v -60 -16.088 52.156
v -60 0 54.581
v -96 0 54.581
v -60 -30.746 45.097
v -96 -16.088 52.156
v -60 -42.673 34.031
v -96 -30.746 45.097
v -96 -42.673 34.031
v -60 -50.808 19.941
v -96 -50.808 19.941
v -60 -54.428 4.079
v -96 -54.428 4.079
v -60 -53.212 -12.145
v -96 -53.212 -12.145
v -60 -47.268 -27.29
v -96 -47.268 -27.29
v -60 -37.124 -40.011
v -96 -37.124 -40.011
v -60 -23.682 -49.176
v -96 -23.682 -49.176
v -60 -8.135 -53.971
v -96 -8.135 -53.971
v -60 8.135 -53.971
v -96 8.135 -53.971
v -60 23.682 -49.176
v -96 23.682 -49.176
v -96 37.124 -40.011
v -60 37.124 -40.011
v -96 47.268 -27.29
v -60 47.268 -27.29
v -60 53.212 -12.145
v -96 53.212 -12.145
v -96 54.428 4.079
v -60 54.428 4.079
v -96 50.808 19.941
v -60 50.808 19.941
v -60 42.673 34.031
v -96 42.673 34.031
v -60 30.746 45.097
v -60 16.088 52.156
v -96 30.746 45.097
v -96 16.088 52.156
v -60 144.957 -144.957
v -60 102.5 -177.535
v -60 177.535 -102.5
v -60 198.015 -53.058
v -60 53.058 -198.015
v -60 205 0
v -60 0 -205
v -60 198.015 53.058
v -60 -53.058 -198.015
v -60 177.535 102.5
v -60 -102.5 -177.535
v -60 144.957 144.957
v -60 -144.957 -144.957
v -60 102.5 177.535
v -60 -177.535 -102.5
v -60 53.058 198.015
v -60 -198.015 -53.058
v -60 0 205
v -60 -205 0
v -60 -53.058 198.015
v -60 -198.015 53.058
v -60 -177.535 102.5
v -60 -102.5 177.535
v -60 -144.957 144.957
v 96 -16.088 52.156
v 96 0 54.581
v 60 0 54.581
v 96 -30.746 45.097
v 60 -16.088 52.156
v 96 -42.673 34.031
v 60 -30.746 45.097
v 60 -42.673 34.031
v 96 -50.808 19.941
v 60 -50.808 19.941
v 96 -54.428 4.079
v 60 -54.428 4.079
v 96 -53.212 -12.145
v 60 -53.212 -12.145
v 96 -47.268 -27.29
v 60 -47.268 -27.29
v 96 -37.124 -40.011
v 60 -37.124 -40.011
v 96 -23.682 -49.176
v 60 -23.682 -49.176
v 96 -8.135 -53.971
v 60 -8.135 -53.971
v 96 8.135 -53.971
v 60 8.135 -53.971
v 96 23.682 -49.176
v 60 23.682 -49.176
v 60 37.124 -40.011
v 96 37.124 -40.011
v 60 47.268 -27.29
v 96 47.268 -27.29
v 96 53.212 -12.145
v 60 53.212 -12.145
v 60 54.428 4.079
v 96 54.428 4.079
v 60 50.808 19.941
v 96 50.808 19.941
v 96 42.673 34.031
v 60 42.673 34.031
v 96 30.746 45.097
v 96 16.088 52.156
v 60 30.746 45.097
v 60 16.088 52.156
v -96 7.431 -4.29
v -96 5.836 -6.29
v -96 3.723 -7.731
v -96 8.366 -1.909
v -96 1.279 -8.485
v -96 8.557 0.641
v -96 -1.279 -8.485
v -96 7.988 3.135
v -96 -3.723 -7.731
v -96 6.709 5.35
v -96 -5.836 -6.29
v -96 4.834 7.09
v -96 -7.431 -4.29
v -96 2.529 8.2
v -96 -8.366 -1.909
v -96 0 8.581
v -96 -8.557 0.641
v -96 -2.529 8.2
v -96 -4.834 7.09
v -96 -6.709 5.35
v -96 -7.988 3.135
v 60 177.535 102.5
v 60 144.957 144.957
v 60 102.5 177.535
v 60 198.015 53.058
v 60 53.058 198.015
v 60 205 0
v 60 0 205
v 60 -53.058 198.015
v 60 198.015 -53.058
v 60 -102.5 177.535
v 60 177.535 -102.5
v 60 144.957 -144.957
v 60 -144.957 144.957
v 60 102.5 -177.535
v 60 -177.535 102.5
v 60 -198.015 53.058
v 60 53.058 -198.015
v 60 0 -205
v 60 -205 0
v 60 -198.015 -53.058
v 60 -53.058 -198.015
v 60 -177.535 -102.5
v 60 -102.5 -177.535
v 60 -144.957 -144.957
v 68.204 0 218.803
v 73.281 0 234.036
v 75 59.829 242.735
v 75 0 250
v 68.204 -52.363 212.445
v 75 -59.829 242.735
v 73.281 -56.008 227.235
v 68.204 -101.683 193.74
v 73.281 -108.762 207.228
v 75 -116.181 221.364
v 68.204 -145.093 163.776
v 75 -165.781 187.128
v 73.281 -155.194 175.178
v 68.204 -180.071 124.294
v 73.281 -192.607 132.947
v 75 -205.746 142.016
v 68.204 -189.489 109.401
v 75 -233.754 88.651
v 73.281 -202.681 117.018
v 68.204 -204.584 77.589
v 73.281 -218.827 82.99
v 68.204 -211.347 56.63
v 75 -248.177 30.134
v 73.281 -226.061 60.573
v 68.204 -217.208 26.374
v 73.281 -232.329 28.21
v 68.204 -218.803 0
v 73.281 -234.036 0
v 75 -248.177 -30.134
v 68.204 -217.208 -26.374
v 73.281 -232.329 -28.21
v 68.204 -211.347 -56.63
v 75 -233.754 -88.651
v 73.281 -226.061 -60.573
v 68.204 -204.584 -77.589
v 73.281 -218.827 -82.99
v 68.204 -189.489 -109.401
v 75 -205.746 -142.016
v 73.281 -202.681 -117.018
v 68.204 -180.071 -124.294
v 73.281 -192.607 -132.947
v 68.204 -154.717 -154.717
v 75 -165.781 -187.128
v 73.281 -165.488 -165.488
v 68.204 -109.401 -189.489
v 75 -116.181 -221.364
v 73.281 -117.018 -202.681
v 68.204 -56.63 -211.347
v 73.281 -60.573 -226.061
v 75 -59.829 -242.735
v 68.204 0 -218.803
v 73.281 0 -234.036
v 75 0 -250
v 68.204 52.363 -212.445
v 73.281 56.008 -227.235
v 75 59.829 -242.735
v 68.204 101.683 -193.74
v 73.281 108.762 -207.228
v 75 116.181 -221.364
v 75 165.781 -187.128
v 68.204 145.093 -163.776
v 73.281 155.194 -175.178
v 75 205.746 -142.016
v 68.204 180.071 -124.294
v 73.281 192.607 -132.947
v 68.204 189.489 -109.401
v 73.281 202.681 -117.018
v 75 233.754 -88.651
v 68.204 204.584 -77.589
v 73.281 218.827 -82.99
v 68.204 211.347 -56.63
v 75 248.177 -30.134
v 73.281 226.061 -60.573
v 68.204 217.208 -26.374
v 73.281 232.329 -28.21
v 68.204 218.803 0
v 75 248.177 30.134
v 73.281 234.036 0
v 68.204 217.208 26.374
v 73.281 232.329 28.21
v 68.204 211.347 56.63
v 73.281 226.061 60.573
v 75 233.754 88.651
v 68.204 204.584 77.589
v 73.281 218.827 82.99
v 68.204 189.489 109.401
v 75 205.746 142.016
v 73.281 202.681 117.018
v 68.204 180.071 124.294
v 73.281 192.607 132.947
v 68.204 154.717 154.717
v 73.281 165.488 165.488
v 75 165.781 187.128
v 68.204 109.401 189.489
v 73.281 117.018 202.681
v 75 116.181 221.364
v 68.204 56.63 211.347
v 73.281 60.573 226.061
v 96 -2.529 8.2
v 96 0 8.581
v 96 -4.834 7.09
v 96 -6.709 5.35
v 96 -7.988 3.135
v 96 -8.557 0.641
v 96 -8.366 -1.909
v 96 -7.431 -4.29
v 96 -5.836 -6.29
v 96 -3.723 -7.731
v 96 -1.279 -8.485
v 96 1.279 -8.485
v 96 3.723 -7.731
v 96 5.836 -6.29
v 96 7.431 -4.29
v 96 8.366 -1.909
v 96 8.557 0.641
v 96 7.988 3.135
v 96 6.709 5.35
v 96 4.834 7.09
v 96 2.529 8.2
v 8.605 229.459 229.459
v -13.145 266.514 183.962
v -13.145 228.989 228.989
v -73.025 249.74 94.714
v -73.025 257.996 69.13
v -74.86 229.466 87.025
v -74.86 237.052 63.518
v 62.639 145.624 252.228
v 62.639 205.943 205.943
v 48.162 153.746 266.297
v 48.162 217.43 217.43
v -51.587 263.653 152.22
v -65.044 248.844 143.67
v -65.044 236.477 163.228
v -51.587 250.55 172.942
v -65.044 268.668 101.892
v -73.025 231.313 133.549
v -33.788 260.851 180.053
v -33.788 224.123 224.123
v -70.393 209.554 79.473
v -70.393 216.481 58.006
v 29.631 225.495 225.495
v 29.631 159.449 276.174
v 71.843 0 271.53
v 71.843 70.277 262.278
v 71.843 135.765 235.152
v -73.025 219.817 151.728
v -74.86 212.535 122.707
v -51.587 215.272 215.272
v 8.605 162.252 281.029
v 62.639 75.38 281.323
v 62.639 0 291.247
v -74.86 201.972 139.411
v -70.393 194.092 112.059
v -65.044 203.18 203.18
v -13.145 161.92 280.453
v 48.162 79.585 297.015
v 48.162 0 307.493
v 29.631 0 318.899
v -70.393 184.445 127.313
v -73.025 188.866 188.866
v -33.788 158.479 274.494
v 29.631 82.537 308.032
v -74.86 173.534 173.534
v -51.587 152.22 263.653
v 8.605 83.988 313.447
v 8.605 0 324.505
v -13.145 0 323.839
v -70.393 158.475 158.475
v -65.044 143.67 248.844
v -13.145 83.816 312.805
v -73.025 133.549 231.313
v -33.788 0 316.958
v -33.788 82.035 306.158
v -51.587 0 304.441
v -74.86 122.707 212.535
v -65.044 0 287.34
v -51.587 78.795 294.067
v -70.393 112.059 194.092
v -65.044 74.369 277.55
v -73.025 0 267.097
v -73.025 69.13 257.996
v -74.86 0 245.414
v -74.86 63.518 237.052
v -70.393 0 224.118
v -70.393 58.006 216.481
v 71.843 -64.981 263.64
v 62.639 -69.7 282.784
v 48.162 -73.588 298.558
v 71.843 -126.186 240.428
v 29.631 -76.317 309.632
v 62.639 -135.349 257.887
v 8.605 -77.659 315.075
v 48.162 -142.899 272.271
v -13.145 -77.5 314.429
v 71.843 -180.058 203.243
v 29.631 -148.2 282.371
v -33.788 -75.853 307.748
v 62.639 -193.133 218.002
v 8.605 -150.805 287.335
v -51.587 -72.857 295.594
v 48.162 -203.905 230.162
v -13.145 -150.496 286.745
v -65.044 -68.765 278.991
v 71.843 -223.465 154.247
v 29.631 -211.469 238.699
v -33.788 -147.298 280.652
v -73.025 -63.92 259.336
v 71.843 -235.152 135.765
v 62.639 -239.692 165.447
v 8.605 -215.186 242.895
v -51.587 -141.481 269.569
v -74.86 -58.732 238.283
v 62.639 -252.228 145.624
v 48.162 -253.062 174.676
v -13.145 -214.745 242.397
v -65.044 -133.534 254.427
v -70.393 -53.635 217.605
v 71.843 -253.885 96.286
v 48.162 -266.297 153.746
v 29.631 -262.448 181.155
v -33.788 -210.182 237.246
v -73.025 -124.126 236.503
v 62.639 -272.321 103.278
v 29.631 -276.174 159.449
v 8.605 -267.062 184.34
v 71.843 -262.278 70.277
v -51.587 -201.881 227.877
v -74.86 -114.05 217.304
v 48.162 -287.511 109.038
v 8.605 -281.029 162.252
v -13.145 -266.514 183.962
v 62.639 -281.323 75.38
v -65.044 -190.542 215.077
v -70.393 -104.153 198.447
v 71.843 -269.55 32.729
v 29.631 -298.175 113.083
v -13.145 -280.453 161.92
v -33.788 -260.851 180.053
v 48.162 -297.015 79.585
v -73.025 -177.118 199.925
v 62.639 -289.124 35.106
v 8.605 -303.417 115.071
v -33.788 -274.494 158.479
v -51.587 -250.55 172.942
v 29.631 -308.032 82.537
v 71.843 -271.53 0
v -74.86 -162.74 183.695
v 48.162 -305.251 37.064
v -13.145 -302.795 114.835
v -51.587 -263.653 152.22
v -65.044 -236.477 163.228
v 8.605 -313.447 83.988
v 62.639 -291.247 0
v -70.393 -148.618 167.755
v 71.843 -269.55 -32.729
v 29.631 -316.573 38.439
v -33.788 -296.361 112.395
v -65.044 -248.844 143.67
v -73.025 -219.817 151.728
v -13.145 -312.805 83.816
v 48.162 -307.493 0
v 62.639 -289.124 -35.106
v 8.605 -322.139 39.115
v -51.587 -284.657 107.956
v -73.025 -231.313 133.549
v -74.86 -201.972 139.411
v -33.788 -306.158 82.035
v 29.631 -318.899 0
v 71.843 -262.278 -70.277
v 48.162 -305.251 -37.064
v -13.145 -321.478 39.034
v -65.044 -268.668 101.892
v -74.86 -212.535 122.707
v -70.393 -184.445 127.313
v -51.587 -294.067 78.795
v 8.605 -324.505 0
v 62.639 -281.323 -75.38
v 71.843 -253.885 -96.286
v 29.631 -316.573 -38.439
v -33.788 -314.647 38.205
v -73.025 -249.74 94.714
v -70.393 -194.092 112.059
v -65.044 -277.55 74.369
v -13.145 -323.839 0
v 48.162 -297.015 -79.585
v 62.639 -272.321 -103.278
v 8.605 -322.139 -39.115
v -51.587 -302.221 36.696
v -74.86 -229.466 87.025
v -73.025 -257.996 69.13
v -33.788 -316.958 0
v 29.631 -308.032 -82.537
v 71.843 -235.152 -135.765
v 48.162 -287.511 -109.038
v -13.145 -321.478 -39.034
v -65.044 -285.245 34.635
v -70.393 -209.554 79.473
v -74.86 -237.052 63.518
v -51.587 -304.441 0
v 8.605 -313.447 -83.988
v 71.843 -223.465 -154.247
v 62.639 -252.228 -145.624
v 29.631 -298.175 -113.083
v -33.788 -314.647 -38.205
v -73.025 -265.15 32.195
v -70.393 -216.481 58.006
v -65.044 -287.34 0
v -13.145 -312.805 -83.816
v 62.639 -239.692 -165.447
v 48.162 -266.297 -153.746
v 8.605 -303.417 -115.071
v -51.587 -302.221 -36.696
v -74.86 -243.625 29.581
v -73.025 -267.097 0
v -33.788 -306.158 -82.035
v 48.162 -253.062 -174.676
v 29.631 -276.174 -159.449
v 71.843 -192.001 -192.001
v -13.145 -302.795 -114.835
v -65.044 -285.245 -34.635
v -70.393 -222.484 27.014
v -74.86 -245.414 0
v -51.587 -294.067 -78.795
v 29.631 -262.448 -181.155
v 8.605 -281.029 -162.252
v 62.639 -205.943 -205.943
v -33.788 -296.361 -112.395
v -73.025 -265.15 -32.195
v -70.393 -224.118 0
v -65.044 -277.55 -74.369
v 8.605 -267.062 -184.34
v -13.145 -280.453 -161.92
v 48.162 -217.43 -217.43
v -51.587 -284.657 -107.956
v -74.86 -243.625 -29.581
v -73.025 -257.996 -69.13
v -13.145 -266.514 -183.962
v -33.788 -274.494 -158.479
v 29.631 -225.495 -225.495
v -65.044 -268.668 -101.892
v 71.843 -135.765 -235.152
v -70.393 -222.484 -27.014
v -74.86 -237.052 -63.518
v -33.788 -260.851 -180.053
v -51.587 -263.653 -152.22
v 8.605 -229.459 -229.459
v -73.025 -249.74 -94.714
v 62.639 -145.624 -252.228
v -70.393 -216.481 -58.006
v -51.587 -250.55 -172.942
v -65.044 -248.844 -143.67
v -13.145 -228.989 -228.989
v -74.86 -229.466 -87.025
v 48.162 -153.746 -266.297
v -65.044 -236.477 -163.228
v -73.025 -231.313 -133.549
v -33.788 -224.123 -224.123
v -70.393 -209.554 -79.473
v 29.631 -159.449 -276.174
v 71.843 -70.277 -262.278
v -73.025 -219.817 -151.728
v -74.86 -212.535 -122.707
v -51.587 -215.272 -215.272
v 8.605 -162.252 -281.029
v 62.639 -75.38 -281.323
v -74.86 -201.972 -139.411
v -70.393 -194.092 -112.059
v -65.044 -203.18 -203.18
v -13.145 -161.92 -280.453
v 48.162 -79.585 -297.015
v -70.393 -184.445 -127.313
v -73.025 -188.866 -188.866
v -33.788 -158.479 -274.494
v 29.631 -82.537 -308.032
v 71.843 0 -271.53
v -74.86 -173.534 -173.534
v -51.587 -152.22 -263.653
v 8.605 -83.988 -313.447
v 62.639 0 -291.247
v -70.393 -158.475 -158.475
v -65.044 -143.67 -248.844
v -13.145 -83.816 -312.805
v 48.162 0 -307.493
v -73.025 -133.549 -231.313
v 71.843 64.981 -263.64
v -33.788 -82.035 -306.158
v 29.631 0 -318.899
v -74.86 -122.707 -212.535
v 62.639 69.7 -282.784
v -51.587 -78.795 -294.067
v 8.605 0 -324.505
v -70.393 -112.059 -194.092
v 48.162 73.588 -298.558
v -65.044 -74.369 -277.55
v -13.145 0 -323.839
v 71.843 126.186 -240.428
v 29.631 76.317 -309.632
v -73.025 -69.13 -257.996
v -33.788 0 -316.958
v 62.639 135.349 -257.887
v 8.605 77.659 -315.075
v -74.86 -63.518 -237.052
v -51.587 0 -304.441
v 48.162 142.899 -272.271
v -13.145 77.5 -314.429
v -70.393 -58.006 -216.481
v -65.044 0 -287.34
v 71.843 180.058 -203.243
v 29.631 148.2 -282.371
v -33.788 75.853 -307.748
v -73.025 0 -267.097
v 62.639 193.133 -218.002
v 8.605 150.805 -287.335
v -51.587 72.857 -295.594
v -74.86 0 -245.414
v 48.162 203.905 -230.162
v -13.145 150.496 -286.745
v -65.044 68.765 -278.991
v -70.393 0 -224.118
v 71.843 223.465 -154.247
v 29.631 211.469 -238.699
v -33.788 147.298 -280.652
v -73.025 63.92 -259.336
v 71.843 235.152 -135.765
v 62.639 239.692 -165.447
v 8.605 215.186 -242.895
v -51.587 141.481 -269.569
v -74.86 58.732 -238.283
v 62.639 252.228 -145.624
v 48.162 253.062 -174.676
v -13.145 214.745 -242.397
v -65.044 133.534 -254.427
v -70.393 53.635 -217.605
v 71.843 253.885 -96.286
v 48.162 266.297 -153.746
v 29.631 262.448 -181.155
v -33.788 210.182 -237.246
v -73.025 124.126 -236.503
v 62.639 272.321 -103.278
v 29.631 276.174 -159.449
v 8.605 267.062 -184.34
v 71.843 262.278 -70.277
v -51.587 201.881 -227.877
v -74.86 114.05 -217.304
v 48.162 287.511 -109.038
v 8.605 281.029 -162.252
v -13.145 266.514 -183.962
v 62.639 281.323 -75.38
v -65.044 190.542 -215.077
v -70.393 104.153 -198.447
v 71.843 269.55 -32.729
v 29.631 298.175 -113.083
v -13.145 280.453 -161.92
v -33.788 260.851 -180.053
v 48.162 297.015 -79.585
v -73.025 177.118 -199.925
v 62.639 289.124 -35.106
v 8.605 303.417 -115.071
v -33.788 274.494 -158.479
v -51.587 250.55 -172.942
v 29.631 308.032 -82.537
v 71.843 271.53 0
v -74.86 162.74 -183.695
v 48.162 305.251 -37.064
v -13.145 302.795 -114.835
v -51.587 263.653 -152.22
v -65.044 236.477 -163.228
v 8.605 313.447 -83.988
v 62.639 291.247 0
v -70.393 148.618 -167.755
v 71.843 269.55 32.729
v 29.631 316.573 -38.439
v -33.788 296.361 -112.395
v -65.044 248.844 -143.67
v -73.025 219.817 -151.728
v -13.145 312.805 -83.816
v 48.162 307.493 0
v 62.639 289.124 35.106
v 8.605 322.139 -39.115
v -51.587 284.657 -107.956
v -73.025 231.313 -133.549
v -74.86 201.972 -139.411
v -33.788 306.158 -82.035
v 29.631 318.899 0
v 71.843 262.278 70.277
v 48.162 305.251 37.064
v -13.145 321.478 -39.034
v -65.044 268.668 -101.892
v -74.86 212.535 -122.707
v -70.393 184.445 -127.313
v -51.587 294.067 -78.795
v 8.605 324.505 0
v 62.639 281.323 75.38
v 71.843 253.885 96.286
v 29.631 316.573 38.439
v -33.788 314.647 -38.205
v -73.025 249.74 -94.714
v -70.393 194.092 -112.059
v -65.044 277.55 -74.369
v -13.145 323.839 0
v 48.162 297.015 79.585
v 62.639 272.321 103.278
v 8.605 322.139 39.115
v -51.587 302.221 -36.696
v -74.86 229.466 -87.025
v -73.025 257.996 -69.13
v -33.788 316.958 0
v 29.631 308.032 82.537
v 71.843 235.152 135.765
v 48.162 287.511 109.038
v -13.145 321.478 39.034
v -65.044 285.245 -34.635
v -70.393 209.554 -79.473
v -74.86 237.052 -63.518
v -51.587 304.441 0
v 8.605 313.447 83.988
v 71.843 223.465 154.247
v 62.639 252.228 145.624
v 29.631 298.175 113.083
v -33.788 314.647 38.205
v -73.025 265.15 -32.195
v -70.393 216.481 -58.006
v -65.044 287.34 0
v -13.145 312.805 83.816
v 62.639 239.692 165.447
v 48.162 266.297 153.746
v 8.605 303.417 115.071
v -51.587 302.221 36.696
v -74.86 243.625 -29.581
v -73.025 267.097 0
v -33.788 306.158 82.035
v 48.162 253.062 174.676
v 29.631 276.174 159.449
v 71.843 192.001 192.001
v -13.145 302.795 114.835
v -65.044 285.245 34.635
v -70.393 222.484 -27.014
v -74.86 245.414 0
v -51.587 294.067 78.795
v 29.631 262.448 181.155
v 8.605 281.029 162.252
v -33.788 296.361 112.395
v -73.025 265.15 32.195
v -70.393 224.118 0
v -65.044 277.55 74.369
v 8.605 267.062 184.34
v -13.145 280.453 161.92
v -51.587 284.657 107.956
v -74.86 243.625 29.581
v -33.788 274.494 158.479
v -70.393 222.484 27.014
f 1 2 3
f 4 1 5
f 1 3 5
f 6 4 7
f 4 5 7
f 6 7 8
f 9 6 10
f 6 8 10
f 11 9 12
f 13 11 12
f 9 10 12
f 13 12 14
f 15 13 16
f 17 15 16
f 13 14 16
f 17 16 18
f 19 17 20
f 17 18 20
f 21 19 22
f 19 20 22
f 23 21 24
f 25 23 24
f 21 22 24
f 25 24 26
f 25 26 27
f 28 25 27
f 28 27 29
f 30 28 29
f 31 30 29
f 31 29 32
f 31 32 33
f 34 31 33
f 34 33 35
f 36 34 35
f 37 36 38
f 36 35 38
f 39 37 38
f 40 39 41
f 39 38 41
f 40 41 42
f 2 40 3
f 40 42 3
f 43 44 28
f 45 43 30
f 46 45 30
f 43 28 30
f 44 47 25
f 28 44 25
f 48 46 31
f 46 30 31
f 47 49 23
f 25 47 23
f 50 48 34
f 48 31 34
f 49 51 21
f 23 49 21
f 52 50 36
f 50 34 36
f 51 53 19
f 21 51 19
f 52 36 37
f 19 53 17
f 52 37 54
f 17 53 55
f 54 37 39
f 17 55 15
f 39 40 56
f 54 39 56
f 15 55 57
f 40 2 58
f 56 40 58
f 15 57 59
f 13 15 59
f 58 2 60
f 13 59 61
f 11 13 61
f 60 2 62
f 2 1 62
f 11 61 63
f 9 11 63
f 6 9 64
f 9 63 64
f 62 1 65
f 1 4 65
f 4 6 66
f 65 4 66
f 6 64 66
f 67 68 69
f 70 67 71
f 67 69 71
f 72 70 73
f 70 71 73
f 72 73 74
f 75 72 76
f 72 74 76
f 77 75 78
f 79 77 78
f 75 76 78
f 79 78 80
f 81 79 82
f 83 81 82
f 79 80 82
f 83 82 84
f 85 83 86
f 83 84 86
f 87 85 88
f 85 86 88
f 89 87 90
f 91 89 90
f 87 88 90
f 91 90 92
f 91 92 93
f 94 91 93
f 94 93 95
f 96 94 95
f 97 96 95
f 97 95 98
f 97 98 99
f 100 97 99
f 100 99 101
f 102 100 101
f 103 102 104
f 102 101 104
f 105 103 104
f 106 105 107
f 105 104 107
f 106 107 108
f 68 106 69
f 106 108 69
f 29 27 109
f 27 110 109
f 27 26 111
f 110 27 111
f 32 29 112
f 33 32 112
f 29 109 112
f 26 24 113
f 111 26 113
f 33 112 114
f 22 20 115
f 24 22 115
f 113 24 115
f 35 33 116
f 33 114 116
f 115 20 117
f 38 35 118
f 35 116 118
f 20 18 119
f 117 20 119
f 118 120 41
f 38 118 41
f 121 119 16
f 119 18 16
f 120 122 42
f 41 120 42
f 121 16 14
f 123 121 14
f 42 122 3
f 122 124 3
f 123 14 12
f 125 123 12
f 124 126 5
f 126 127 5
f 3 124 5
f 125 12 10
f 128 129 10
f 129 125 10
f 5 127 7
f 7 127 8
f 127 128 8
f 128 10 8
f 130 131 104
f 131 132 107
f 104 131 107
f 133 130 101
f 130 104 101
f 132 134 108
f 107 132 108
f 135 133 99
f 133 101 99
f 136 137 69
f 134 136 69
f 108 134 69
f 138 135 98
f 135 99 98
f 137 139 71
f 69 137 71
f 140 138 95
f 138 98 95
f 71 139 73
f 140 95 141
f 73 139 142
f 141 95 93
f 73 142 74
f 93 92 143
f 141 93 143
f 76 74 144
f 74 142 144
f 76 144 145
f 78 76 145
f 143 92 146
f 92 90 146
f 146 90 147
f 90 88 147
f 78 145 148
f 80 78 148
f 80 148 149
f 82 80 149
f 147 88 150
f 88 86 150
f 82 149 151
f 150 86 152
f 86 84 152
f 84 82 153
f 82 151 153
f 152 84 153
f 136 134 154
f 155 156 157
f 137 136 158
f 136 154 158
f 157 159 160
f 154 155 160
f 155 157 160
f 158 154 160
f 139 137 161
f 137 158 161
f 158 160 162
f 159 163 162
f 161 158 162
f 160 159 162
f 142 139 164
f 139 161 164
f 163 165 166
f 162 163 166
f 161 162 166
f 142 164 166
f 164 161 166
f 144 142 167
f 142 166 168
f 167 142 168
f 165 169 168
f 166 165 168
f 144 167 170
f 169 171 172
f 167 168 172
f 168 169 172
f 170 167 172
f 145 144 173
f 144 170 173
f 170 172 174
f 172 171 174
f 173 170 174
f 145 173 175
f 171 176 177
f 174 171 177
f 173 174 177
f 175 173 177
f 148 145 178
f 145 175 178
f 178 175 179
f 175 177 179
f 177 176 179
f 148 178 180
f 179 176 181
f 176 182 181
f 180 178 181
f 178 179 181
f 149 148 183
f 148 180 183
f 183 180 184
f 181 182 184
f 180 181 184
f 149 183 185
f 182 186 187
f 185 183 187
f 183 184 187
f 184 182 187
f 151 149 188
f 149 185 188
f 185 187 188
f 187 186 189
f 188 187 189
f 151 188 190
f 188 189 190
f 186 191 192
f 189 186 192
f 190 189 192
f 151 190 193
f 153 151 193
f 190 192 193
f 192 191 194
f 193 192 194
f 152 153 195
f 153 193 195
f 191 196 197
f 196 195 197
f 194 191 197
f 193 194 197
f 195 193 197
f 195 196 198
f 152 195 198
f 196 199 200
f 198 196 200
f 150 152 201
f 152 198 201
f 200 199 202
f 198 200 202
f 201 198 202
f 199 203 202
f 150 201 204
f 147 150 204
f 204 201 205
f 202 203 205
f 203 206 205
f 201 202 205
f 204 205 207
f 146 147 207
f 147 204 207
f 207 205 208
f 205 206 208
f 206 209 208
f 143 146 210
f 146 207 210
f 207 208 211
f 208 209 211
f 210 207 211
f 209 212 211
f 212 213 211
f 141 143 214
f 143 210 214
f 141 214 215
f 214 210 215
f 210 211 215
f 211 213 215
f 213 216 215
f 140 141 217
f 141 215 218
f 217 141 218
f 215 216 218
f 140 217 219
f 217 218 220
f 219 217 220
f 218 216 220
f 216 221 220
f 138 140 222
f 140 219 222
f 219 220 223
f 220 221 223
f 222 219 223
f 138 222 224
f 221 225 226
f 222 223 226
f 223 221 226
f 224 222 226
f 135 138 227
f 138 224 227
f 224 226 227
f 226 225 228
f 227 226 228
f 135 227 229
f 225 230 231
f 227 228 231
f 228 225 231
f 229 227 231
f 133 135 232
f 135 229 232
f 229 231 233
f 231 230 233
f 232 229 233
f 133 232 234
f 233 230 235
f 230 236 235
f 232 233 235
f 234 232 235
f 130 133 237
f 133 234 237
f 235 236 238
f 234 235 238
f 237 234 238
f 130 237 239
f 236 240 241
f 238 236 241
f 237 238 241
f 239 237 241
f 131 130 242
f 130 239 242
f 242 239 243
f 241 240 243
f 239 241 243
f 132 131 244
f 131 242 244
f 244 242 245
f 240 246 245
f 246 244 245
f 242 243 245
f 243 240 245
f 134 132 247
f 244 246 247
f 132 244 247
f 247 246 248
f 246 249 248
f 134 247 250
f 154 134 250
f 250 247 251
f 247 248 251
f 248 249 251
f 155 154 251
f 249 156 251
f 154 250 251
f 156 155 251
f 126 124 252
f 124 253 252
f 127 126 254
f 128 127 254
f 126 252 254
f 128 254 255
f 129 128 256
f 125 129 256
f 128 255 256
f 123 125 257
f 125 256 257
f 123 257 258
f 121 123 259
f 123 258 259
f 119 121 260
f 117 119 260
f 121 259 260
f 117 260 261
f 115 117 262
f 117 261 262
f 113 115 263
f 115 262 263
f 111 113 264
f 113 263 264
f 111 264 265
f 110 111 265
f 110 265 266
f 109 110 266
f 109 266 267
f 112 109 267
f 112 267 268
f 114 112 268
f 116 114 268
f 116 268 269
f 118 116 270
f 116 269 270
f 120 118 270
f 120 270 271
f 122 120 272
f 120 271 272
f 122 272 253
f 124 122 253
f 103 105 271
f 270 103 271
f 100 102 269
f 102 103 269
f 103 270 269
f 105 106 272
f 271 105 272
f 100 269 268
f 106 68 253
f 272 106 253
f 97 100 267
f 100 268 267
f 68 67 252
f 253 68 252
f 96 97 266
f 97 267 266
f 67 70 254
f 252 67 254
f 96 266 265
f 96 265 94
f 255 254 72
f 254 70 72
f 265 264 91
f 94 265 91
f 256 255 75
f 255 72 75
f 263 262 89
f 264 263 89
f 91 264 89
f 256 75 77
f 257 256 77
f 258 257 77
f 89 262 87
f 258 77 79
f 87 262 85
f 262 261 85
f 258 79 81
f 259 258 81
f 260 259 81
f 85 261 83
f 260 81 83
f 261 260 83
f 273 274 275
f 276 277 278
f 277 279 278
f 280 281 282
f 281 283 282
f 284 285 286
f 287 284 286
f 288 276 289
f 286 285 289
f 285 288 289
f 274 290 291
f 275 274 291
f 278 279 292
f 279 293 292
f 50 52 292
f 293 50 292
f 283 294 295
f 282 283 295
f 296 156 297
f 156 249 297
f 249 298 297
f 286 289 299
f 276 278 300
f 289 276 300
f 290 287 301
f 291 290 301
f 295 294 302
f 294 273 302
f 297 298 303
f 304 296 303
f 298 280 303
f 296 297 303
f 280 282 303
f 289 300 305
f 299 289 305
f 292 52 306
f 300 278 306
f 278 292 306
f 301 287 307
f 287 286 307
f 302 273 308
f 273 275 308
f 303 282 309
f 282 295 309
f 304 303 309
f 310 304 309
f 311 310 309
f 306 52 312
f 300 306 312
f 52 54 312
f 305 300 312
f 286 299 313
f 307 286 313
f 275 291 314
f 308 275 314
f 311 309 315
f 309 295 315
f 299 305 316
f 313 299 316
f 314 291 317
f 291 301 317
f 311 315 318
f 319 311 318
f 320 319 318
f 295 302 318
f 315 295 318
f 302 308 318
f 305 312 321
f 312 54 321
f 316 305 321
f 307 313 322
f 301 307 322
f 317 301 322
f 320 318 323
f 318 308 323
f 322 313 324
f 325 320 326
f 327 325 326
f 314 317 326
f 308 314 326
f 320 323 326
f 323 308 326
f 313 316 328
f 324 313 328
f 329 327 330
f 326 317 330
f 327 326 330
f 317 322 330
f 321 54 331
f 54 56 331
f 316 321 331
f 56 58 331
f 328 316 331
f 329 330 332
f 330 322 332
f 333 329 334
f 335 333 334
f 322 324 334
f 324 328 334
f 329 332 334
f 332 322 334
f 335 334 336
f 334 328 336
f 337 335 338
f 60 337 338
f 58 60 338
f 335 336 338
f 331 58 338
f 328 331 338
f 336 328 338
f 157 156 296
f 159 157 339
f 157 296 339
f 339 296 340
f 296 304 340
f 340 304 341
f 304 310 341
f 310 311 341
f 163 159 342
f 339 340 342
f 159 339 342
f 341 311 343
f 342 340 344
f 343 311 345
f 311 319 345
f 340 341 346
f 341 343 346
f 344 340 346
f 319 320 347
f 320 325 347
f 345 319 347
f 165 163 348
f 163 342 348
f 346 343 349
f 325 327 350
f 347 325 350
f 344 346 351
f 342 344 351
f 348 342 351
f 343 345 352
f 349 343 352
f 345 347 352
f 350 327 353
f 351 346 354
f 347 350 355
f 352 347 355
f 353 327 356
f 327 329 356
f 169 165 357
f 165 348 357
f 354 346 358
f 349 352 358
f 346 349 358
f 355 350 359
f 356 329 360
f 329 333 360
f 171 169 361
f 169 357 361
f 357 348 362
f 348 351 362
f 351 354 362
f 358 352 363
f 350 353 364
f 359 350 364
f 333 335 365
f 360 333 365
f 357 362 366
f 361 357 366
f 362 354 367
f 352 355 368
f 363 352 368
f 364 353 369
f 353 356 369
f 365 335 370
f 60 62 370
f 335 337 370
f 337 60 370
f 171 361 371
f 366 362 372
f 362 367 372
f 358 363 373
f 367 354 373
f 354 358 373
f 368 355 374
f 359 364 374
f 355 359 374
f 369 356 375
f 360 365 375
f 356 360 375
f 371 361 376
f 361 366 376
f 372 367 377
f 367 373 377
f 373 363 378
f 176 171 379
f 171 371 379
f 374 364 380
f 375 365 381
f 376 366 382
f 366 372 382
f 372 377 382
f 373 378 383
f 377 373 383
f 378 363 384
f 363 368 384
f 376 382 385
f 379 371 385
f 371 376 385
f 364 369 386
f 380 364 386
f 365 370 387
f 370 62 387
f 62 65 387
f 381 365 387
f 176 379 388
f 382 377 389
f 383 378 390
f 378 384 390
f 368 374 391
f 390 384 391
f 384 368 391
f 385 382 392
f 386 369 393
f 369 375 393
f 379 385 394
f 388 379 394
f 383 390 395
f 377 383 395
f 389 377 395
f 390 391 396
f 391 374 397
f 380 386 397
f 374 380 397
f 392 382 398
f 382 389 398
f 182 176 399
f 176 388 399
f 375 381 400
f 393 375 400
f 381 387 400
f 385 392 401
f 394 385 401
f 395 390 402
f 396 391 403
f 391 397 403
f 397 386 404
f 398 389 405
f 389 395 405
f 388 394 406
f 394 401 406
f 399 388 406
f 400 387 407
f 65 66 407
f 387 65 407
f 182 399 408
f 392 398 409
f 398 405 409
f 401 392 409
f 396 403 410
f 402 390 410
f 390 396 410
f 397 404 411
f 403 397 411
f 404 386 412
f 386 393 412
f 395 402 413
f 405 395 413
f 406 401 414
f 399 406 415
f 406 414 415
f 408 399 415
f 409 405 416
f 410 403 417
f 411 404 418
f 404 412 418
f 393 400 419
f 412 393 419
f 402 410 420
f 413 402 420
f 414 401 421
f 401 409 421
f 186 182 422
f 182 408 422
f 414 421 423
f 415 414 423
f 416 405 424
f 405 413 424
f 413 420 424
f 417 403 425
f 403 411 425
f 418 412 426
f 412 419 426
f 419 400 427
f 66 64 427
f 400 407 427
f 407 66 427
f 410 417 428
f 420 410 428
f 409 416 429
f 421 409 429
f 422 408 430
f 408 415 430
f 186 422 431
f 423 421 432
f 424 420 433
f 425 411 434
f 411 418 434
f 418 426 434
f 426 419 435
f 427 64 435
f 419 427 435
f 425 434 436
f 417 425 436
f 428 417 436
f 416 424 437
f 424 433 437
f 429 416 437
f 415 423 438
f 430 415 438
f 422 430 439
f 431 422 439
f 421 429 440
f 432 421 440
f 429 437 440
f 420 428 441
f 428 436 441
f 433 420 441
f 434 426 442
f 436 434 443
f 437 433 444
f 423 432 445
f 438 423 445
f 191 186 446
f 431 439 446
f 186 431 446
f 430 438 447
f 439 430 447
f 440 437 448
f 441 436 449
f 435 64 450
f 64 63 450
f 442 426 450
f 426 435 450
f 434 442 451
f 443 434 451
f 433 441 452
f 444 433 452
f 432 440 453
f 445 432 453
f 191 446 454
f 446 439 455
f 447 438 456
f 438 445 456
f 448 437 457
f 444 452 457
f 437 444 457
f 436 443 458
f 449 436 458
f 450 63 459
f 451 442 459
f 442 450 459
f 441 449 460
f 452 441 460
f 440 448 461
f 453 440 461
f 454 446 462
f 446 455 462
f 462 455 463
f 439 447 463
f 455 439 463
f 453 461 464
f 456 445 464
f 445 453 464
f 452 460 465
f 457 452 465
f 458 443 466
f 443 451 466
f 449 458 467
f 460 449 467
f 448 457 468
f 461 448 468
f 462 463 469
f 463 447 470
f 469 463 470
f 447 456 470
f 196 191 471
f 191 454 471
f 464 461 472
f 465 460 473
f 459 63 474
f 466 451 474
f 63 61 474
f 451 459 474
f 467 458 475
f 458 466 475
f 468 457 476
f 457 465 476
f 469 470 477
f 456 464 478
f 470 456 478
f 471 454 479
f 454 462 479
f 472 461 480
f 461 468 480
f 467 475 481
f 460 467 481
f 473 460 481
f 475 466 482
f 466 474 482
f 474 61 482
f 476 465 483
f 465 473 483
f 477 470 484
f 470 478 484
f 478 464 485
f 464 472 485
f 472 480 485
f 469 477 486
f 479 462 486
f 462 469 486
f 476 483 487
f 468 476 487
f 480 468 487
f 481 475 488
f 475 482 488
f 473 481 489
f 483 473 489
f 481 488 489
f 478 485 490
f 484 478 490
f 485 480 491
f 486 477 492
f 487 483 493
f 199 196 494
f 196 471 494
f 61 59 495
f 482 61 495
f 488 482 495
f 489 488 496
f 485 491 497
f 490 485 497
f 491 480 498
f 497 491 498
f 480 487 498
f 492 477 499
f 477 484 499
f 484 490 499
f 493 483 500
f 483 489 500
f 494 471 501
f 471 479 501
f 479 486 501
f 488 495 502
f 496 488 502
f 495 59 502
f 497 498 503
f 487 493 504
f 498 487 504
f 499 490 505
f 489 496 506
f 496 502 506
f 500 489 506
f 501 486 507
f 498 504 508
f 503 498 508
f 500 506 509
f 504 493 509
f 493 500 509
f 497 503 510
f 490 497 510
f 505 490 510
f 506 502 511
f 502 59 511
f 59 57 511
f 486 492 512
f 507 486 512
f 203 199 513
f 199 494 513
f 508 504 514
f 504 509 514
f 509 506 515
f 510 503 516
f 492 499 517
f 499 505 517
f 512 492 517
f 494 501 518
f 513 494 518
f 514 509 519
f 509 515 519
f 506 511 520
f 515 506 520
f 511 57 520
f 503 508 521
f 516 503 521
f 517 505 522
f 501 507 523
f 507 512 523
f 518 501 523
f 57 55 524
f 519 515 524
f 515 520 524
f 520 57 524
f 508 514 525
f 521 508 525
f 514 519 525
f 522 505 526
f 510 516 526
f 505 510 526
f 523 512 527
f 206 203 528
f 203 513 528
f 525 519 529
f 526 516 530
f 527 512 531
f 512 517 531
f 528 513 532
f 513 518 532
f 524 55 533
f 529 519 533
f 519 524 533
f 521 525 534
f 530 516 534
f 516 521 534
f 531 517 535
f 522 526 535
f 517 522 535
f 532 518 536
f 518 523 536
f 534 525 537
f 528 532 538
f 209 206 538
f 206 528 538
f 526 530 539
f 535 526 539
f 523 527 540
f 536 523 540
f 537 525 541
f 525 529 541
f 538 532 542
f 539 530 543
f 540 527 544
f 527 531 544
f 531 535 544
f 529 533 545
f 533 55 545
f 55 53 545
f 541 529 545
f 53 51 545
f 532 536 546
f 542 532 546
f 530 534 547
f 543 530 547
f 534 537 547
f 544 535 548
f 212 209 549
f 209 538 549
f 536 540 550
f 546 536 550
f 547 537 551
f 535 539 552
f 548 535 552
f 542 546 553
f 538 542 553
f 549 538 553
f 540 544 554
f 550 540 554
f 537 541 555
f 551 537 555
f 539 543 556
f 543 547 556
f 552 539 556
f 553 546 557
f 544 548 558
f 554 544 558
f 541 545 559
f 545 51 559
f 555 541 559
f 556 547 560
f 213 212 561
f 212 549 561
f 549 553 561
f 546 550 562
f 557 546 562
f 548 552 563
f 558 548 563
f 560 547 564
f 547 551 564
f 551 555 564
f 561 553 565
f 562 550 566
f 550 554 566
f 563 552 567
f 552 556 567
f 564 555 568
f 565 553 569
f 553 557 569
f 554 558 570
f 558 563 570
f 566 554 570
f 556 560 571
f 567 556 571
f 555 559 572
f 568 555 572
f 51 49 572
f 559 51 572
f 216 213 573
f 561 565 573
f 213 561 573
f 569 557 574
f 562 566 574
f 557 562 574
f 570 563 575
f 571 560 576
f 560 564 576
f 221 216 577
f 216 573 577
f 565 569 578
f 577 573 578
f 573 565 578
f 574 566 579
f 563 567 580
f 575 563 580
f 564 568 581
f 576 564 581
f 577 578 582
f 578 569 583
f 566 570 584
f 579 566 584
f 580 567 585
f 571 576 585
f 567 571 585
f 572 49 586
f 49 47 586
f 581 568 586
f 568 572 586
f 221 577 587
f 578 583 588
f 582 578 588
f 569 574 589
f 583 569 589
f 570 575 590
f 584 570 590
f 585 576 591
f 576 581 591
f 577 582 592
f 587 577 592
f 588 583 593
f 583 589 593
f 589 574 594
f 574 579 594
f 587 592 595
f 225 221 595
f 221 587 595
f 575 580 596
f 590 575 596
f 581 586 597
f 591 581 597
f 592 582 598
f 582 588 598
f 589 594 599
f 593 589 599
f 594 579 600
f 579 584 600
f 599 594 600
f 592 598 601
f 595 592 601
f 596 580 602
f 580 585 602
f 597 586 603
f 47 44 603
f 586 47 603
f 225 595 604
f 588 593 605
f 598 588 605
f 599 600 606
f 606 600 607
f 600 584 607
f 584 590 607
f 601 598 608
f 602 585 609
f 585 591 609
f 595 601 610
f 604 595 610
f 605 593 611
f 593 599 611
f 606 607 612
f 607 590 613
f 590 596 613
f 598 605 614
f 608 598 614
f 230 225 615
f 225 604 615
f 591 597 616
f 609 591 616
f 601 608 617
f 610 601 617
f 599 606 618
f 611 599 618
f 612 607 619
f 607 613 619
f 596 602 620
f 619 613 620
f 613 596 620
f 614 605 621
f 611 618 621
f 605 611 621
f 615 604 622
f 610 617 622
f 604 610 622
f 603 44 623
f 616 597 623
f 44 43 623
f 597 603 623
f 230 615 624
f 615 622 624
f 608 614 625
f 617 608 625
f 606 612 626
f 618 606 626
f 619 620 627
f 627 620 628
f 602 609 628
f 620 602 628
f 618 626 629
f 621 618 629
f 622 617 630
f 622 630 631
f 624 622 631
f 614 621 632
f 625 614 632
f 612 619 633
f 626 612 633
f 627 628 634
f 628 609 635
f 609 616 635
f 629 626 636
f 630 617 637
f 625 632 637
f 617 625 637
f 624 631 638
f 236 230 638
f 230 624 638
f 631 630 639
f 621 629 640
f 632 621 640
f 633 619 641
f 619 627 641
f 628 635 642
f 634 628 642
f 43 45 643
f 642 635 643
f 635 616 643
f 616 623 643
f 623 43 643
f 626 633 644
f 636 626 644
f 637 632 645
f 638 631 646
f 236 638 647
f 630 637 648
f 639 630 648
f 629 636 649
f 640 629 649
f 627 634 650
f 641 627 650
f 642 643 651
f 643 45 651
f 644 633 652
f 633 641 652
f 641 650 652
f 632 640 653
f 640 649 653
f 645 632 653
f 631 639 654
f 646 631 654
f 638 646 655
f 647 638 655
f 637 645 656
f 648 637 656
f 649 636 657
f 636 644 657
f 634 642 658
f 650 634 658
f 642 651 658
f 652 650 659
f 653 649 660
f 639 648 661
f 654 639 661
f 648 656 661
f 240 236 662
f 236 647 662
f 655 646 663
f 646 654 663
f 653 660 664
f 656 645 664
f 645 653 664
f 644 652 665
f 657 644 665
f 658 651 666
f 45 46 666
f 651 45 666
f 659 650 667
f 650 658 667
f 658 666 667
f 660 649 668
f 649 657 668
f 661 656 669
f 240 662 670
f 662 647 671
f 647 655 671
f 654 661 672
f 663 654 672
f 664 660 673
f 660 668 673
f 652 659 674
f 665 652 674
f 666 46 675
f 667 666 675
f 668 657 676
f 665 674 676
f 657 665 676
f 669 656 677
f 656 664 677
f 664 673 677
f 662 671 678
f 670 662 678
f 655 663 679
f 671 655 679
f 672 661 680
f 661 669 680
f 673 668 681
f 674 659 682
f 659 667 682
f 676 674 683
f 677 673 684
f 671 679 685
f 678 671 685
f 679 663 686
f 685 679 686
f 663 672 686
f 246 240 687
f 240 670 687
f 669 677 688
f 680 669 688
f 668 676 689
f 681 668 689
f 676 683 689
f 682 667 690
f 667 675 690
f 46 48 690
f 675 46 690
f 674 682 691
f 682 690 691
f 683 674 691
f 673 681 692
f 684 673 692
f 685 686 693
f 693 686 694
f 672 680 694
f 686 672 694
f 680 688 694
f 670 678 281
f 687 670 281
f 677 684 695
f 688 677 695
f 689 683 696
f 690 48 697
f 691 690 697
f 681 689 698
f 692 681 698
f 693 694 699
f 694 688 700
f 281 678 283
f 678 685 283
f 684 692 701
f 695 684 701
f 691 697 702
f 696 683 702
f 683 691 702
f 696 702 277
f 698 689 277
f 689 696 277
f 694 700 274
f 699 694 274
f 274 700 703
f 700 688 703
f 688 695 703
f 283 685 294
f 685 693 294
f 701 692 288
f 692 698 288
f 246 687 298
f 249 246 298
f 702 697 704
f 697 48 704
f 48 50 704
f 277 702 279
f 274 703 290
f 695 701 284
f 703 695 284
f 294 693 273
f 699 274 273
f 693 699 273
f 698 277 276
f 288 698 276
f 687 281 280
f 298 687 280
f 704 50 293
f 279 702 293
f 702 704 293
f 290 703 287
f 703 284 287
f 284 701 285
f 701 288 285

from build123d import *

# Parameters (mm, degrees)
F3_DEPTH = 25


with BuildPart() as f1:
    # F0 (on Front) → F1 (revolve)
    with BuildSketch(Plane.XZ):
        with BuildLine():
            Line((-96, 54.58075), (-96, 8.58075))
            Line((-96, 8.58075), (96, 8.58075))
            Line((96, 8.58075), (96, 54.58075))
            Line((96, 54.58075), (60, 54.58075))
            Line((60, 54.58075), (60, 205))
            ThreePointArc((60, 205), (0, 175), (-60, 205))
            Line((-60, 205), (-60, 54.58075))
            Line((-60, 54.58075), (-96, 54.58075))
        make_face()
        with BuildLine():
            ThreePointArc((75, 250), (-23.717082, 321.151247), (-60, 205))
            ThreePointArc((-60, 205), (0, 175), (60, 205))
            ThreePointArc((60, 205), (71.151247, 226.282918), (75, 250))
        make_face()
    revolve(axis=Axis((0, 0, 0), (1, 0, 0)))

    # F2 (on face) → F3 (join)
    with BuildSketch(Plane(origin=(-60, 0, 0), x_dir=(0, -1, 0), z_dir=(-1, 0, 0))):
        with BuildLine():
            ThreePointArc((-54.100605, 185.262313), (-60.432679, 179.731135), (-60.307153, 171.324392))
            Line((-60.307153, 171.324392), (-12.55207, 72.159939))
            ThreePointArc((-12.55207, 72.159939), (-8.665392, 67.910717), (-3.079813, 66.509481))
            ThreePointArc((-3.079813, 66.509481), (0, 66.58075), (3.079813, 66.509481))
            ThreePointArc((3.079813, 66.509481), (8.665392, 67.910717), (12.55207, 72.159939))
            Line((12.55207, 72.159939), (60.307153, 171.324392))
            ThreePointArc((60.307153, 171.324392), (60.432679, 179.731135), (54.100605, 185.262313))
            ThreePointArc((54.100605, 185.262313), (0, 193), (-54.100605, 185.262313))
        make_face()
    extrude(amount=-F3_DEPTH)


solid = f1.part
